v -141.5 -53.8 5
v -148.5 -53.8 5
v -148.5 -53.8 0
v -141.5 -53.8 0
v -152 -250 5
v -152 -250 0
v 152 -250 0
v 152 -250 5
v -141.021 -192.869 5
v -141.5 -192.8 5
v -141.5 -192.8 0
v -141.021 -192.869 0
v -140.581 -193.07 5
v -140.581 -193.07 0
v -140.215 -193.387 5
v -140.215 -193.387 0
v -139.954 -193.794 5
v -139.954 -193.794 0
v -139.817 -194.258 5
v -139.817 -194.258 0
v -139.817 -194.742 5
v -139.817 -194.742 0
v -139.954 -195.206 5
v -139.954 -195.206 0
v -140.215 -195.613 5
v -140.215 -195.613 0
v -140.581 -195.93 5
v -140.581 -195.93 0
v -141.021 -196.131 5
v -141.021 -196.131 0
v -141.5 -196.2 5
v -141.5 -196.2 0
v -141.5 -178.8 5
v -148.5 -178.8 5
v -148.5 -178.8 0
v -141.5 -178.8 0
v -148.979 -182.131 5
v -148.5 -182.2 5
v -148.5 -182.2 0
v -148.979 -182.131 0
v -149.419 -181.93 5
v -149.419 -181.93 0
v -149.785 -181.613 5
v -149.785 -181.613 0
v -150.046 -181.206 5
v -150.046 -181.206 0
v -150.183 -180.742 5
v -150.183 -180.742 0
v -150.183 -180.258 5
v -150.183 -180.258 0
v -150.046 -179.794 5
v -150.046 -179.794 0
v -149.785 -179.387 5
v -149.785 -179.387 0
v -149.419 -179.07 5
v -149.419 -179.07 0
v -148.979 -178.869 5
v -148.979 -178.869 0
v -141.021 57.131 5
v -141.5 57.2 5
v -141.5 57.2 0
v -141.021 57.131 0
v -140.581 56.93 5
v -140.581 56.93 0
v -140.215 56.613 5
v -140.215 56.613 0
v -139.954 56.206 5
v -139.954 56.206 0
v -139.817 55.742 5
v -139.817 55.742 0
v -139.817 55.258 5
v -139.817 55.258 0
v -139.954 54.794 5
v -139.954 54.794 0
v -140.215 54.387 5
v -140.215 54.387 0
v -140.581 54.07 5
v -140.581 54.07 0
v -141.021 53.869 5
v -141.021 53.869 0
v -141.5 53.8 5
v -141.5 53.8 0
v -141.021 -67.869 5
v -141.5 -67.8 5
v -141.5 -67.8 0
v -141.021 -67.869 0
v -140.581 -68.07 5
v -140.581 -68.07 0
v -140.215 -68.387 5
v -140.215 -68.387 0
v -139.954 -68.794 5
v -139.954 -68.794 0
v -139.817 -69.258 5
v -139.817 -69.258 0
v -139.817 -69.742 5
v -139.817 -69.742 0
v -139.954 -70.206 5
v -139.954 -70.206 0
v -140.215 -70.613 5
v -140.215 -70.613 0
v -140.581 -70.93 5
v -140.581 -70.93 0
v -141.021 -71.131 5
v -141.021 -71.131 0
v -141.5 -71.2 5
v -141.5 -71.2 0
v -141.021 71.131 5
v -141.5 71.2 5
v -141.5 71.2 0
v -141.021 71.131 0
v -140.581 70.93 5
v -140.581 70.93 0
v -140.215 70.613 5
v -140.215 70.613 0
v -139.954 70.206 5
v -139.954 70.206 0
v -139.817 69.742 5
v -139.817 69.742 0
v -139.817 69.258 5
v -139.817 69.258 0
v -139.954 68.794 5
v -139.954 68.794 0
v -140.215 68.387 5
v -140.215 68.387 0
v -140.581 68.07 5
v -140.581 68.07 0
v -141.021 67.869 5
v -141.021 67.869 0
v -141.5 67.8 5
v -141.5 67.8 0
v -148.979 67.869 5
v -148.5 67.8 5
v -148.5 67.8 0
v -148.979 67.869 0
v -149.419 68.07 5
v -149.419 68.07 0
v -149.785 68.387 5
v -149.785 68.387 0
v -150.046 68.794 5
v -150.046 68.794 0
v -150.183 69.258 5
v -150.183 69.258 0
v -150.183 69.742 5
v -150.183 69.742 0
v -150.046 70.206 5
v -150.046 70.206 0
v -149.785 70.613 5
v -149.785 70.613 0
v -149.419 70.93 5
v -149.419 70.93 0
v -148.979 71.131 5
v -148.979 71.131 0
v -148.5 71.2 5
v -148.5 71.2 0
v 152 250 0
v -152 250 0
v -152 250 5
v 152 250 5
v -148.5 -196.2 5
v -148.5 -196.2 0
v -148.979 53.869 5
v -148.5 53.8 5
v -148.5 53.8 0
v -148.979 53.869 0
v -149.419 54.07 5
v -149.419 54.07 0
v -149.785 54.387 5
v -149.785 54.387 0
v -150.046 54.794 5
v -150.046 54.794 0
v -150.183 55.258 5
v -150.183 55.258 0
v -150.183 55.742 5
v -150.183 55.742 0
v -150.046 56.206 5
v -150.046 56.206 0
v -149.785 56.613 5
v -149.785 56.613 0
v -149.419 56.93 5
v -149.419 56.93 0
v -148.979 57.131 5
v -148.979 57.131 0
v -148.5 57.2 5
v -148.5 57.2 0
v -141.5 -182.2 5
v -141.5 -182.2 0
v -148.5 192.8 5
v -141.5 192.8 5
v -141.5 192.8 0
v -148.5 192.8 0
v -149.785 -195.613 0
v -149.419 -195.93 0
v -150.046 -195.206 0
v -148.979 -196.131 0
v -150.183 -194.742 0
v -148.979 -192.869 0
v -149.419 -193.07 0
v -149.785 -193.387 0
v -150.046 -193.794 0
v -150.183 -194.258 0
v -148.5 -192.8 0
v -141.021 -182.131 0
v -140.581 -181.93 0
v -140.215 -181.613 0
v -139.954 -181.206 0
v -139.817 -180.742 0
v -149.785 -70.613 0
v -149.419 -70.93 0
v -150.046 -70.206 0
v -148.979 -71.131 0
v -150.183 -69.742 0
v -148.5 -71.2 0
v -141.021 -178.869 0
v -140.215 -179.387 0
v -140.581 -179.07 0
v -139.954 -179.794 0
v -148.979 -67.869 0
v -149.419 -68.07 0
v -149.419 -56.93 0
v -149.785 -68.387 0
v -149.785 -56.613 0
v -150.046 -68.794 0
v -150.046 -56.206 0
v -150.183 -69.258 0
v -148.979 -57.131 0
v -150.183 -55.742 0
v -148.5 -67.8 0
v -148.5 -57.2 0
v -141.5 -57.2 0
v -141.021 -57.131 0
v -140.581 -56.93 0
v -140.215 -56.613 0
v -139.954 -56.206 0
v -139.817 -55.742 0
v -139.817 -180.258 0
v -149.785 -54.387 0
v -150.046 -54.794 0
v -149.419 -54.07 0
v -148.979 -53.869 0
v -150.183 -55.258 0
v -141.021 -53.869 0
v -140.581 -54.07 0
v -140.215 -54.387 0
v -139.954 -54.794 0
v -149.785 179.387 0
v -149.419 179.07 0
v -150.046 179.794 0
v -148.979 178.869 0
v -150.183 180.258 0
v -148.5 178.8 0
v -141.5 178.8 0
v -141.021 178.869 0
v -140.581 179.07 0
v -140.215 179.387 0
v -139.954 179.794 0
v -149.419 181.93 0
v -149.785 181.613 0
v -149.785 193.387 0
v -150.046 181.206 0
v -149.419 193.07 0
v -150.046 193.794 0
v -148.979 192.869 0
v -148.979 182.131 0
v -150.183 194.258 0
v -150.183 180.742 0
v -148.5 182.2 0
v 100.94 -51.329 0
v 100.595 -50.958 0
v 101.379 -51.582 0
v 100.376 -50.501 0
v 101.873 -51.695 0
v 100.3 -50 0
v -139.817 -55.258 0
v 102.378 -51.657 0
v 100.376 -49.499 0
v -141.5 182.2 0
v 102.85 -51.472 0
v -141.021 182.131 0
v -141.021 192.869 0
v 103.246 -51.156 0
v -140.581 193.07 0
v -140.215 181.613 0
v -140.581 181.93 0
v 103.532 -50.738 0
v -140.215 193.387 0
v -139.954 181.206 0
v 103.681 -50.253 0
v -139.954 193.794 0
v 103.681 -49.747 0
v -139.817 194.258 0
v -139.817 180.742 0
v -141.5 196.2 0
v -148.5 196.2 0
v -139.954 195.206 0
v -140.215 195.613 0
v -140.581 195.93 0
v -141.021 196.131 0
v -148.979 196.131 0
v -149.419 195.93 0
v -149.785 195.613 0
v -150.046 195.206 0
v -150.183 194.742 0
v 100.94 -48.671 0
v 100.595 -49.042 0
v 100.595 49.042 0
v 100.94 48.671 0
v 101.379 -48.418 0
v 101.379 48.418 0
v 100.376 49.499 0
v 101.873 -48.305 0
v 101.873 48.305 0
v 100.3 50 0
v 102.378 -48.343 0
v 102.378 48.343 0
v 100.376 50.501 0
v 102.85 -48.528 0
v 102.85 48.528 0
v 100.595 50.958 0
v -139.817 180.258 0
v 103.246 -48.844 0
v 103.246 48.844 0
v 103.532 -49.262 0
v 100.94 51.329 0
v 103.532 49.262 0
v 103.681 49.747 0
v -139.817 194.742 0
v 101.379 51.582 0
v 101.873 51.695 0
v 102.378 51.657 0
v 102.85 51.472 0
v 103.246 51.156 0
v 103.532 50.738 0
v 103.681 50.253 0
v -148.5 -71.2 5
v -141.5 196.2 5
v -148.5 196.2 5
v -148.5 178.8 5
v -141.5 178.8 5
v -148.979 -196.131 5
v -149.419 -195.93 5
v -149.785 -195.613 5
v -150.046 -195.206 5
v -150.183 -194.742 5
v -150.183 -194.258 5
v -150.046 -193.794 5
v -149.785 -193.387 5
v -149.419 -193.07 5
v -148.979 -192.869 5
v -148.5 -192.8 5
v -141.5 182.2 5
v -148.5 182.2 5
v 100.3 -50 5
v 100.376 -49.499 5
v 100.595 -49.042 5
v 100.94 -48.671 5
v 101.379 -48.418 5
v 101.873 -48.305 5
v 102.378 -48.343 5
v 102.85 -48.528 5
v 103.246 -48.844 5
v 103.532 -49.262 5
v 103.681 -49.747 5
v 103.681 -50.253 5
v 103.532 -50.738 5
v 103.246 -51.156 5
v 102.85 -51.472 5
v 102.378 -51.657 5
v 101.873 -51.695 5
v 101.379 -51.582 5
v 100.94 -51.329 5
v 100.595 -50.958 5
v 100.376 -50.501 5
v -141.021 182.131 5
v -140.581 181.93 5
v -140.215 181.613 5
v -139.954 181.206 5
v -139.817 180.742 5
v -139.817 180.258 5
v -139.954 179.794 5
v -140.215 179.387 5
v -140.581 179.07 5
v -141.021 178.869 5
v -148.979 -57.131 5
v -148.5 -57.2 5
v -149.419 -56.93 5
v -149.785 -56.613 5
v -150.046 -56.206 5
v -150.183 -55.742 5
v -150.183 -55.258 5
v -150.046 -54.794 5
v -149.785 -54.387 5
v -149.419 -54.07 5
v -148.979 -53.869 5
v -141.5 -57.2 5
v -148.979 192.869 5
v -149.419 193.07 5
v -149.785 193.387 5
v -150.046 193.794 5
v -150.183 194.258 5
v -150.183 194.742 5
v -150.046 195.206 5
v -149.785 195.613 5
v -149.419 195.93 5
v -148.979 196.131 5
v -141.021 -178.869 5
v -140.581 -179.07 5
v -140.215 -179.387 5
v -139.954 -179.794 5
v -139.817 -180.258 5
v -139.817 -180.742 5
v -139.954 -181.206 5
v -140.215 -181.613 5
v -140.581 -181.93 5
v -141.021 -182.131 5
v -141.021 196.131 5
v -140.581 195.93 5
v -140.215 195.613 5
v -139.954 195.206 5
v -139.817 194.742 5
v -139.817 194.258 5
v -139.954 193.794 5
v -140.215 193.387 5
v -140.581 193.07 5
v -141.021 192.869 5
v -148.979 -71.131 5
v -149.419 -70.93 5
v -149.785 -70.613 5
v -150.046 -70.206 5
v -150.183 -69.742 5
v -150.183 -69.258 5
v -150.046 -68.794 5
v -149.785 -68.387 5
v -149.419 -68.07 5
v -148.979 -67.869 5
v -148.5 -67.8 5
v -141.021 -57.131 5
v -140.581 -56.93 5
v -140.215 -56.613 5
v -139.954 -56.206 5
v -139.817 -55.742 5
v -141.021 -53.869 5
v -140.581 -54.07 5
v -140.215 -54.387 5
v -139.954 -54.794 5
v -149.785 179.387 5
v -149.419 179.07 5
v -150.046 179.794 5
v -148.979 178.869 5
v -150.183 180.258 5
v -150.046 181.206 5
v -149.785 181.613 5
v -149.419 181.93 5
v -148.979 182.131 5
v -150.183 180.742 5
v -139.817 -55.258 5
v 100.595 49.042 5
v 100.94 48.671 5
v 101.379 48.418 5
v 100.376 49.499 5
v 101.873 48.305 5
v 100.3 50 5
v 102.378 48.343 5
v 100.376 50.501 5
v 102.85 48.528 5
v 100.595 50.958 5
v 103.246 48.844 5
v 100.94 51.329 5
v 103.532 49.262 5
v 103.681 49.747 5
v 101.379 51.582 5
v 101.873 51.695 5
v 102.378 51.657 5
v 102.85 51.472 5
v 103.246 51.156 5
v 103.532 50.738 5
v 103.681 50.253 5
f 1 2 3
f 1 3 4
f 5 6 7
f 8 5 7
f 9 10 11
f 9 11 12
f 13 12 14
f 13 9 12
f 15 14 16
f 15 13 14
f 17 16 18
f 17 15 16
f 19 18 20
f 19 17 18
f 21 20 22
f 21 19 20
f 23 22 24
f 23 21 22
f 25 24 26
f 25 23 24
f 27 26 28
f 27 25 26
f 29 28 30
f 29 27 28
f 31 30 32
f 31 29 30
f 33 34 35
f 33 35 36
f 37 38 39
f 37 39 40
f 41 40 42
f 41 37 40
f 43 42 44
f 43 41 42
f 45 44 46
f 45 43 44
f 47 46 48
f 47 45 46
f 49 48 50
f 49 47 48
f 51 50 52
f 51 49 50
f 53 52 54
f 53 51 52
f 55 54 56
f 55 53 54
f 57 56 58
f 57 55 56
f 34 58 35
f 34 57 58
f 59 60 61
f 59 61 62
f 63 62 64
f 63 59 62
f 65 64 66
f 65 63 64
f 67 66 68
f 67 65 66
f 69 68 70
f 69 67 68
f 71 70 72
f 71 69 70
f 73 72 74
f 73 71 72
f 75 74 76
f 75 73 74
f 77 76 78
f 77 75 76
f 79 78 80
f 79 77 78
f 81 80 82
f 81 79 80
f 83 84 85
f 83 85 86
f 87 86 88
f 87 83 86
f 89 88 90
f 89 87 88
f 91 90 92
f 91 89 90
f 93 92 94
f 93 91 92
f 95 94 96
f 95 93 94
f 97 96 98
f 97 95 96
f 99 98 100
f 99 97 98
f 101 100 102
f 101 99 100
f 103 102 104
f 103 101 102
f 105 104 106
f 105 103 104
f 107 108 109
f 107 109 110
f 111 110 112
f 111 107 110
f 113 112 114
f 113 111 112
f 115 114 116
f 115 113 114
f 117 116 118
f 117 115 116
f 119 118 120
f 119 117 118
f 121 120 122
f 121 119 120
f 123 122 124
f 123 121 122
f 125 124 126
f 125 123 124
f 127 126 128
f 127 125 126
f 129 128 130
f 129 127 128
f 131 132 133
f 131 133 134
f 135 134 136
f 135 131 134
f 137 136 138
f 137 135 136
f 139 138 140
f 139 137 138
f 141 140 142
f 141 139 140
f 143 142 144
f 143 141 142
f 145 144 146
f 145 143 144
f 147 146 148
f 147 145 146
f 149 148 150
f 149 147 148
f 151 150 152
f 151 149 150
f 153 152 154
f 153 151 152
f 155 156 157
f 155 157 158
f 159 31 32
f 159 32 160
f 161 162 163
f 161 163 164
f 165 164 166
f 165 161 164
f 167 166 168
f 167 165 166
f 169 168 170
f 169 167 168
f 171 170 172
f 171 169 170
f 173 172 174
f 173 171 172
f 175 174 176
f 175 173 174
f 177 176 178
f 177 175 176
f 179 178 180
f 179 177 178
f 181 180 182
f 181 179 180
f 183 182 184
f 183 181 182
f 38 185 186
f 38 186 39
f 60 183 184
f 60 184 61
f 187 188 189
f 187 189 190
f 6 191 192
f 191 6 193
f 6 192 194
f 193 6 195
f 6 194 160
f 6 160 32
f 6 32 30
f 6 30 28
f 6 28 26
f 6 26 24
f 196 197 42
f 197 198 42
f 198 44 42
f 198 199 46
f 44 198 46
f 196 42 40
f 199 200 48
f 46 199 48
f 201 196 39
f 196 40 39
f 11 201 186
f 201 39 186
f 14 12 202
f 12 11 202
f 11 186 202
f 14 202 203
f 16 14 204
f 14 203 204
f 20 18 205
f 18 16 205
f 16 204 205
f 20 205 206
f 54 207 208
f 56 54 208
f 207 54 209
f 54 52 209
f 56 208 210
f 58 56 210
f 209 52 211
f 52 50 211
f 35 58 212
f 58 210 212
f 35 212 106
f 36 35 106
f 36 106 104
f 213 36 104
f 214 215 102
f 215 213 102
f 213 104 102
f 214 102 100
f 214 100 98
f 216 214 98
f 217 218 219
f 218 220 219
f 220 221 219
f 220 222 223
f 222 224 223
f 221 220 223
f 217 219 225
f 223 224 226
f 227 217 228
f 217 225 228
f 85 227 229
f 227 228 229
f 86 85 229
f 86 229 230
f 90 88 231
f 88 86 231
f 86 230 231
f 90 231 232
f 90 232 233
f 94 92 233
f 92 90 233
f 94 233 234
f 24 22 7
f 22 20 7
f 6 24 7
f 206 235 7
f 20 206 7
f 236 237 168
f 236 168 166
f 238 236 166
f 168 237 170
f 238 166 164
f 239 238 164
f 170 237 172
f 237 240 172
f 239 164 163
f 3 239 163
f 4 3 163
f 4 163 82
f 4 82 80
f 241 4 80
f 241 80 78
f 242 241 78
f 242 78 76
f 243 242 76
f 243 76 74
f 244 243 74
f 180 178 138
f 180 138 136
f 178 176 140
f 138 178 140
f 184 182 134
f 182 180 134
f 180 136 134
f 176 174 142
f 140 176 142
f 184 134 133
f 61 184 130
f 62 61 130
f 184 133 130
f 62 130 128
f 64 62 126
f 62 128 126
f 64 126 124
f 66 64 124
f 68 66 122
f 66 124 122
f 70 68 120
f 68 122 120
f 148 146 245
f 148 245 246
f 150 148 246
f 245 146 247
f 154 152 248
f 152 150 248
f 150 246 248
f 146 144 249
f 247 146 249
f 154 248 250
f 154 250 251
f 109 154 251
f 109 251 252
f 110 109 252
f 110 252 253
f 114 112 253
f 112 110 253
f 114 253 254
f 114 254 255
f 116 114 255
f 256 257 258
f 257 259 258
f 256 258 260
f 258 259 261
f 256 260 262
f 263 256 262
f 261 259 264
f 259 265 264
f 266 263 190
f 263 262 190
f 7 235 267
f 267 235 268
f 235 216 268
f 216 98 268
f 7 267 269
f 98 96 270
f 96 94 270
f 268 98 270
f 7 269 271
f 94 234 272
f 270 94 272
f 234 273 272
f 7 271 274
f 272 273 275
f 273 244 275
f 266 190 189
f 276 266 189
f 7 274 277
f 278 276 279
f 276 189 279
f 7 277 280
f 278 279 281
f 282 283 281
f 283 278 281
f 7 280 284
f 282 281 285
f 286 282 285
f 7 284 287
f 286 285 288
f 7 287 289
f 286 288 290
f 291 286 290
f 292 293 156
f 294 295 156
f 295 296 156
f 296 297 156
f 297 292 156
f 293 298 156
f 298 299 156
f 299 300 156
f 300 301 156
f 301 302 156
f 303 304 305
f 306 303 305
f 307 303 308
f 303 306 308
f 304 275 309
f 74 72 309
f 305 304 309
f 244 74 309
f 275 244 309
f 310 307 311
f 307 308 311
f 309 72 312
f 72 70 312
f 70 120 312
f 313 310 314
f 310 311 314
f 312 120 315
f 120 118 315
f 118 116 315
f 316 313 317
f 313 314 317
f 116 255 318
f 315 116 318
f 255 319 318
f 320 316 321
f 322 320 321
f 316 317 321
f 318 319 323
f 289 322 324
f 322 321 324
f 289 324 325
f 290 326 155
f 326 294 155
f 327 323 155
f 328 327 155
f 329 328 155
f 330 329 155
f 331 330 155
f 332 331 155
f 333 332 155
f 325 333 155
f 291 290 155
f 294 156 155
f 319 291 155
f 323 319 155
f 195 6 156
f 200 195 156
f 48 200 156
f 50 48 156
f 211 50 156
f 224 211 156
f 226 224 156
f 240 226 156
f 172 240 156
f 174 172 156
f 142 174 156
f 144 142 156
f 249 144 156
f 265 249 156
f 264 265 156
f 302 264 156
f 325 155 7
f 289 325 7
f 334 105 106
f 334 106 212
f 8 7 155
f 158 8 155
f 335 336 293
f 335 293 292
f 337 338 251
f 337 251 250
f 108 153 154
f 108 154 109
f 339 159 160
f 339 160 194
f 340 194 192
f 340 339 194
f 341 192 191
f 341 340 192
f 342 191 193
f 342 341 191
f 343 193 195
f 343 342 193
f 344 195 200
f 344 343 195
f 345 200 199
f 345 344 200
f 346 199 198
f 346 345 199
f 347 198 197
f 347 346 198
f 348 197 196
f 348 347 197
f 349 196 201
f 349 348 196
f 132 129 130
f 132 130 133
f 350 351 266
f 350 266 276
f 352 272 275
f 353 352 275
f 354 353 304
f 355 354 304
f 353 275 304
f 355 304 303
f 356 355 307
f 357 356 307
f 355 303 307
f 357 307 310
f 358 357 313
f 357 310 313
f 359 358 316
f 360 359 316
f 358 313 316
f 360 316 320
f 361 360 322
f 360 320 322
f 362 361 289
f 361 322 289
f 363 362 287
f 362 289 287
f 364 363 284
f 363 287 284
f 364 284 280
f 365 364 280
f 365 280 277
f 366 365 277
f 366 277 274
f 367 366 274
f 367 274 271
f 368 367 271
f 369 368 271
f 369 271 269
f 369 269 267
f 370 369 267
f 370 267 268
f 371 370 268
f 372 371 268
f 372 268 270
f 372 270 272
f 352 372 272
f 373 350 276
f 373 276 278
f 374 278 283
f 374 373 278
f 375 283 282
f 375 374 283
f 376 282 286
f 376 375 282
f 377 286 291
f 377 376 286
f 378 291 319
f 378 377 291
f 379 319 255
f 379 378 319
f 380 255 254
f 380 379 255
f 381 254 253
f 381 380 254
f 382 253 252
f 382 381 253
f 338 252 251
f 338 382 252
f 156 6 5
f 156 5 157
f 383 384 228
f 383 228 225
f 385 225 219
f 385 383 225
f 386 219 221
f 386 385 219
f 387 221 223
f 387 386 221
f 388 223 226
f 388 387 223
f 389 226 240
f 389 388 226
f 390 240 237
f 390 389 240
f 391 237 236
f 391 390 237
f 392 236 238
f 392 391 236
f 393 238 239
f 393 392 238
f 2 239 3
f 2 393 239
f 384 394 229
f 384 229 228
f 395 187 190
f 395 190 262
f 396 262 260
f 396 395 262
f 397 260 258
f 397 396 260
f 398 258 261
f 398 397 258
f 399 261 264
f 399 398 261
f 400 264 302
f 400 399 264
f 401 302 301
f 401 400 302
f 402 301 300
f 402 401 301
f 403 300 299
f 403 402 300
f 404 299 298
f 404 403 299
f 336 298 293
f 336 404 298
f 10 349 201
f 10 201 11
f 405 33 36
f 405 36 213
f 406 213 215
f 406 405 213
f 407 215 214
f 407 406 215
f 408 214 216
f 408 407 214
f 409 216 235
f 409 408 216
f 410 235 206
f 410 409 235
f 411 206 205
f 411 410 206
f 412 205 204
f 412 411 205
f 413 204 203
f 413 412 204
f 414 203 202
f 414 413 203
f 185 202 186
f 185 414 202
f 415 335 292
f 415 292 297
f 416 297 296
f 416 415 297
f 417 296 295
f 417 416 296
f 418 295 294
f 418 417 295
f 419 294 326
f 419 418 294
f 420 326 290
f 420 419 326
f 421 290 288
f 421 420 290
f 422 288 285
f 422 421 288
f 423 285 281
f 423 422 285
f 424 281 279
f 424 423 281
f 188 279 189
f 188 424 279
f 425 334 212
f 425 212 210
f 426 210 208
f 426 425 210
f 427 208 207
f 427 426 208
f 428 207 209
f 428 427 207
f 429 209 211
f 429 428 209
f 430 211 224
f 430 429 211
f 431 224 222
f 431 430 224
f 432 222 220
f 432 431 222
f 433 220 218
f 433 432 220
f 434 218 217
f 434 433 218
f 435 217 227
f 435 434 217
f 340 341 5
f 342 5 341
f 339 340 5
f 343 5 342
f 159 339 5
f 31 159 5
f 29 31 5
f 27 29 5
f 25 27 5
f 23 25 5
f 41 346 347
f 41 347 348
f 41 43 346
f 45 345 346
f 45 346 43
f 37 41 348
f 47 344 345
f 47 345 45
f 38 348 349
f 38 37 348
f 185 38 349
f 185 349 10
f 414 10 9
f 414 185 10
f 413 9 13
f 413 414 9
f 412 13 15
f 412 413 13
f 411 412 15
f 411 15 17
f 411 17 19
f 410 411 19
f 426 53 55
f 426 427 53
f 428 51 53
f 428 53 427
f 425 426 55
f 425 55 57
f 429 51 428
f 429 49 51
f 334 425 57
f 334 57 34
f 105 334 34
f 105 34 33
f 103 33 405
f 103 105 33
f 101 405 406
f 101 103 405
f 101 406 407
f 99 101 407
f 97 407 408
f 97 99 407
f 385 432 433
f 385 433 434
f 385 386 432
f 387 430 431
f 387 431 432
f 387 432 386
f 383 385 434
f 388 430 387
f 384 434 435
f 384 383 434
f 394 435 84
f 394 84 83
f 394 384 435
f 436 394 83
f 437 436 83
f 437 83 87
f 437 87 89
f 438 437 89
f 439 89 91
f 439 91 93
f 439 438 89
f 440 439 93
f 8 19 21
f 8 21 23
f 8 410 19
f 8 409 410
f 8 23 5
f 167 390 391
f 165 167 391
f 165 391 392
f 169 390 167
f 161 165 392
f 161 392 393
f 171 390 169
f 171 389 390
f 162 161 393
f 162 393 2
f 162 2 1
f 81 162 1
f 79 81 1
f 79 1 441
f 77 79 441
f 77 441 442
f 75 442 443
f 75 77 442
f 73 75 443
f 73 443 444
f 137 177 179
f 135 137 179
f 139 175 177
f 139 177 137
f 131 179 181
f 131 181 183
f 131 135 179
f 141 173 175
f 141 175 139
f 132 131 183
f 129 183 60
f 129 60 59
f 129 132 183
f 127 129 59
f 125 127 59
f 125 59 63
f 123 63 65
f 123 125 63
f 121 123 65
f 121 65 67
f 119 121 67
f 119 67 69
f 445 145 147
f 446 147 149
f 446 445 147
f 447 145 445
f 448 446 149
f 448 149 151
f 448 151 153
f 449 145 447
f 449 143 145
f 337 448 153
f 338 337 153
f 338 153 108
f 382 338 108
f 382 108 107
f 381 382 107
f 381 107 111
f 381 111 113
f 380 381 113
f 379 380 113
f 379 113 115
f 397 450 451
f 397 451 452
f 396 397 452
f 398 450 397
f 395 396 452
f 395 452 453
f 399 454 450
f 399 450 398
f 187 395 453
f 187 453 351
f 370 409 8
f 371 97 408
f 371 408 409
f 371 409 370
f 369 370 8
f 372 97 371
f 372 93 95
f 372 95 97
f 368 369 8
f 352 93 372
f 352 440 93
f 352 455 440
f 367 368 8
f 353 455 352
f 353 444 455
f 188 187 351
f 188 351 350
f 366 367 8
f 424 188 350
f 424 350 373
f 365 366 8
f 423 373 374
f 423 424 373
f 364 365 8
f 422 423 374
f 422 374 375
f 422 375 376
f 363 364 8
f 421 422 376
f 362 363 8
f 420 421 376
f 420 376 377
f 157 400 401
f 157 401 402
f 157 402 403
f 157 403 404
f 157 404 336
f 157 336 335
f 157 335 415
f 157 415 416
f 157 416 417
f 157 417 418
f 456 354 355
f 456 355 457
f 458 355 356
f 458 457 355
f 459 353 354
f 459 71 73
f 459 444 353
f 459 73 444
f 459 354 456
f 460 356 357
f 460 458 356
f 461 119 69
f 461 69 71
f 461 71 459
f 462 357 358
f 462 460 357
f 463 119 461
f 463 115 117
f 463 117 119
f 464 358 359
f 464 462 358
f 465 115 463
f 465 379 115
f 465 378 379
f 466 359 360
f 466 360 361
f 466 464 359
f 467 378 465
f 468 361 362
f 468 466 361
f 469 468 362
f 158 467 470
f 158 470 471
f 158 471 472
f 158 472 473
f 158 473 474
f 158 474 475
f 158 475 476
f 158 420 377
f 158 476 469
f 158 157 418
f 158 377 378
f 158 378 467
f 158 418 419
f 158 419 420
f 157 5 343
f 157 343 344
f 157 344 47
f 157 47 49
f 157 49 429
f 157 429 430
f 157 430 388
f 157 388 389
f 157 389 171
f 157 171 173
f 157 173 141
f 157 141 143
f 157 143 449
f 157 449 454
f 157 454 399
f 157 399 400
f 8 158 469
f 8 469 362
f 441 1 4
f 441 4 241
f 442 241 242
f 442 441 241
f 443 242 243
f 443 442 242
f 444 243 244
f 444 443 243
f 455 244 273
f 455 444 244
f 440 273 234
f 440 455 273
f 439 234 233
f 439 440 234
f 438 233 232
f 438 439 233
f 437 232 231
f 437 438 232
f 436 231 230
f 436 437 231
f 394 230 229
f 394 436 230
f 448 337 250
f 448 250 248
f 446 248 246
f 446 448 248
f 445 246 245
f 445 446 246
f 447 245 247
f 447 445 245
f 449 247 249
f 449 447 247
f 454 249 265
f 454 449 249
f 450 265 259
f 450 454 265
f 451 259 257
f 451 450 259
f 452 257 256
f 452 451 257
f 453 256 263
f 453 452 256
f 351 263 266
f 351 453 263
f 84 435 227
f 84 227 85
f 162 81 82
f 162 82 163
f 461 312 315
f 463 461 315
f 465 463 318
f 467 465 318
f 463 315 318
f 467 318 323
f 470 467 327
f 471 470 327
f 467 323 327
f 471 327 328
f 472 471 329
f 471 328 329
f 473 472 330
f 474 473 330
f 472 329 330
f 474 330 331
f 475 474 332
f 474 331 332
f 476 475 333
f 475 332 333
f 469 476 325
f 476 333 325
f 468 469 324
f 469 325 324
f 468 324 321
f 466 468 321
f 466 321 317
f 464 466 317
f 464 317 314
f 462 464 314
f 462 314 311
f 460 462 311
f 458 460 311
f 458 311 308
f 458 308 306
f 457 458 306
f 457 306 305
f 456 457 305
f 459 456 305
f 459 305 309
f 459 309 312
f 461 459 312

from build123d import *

# Parameters (mm, degrees)
ESQUISSE1_W             = 304
ESQUISSE1_H             = 500
BOSS_EXTRU_1_DEPTH      = 5
D_GAGEMENT_M34_D        = 3.4
ENL_V_MAT_EXTRU_3_REACH = 294.624


with BuildPart() as part:
    # Esquisse1 → Boss.-Extru.1 (new body)
    with BuildSketch(Plane.XY):
        Rectangle(ESQUISSE1_W, ESQUISSE1_H)
    extrude(amount=BOSS_EXTRU_1_DEPTH)

    # Dégagement M34 (through all)
    with Locations(Plane.XY.offset(5)):
        with Locations((102, -50), (102, 50)):
            Hole(D_GAGEMENT_M34_D / 2)

    # Esquisse15 → Enlèv. mat.-Extru.3 (cut, up to next)
    with BuildSketch(Plane.XY.offset(5), mode=Mode.PRIVATE) as enl_v_mat_extru_3_sk1:
        with BuildLine():
            Line((-148.5, -192.8), (-141.5, -192.8))
            ThreePointArc((-141.5, -192.8), (-139.8, -194.5), (-141.5, -196.2))
            Line((-141.5, -196.2), (-148.5, -196.2))
            ThreePointArc((-148.5, -196.2), (-150.2, -194.5), (-148.5, -192.8))
        make_face()
    enl_v_mat_extru_3_tool1 = extrude(enl_v_mat_extru_3_sk1.sketch, amount=-ENL_V_MAT_EXTRU_3_REACH, mode=Mode.PRIVATE) & part.part
    # Esquisse15 → Enlèv. mat.-Extru.3 (cut, up to next)
    with BuildSketch(Plane.XY.offset(5), mode=Mode.PRIVATE) as enl_v_mat_extru_3_sk2:
        with BuildLine():
            Line((-141.5, -182.2), (-148.5, -182.2))
            ThreePointArc((-148.5, -182.2), (-150.2, -180.5), (-148.5, -178.8))
            Line((-148.5, -178.8), (-141.5, -178.8))
            ThreePointArc((-141.5, -178.8), (-139.8, -180.5), (-141.5, -182.2))
        make_face()
    enl_v_mat_extru_3_tool2 = extrude(enl_v_mat_extru_3_sk2.sketch, amount=-ENL_V_MAT_EXTRU_3_REACH, mode=Mode.PRIVATE) & part.part
    # Esquisse15 → Enlèv. mat.-Extru.3 (cut, up to next)
    with BuildSketch(Plane.XY.offset(5), mode=Mode.PRIVATE) as enl_v_mat_extru_3_sk3:
        with BuildLine():
            Line((-148.5, -67.8), (-141.5, -67.8))
            ThreePointArc((-141.5, -67.8), (-139.8, -69.5), (-141.5, -71.2))
            Line((-141.5, -71.2), (-148.5, -71.2))
            ThreePointArc((-148.5, -71.2), (-150.2, -69.5), (-148.5, -67.8))
        make_face()
    enl_v_mat_extru_3_tool3 = extrude(enl_v_mat_extru_3_sk3.sketch, amount=-ENL_V_MAT_EXTRU_3_REACH, mode=Mode.PRIVATE) & part.part
    # Esquisse15 → Enlèv. mat.-Extru.3 (cut, up to next)
    with BuildSketch(Plane.XY.offset(5), mode=Mode.PRIVATE) as enl_v_mat_extru_3_sk4:
        with BuildLine():
            Line((-141.5, -57.2), (-148.5, -57.2))
            ThreePointArc((-148.5, -57.2), (-150.2, -55.5), (-148.5, -53.8))
            Line((-148.5, -53.8), (-141.5, -53.8))
            ThreePointArc((-141.5, -53.8), (-139.8, -55.5), (-141.5, -57.2))
        make_face()
    enl_v_mat_extru_3_tool4 = extrude(enl_v_mat_extru_3_sk4.sketch, amount=-ENL_V_MAT_EXTRU_3_REACH, mode=Mode.PRIVATE) & part.part
    # Esquisse15 → Enlèv. mat.-Extru.3 (cut, up to next)
    with BuildSketch(Plane.XY.offset(5), mode=Mode.PRIVATE) as enl_v_mat_extru_3_sk5:
        with BuildLine():
            Line((-148.5, 57.2), (-141.5, 57.2))
            ThreePointArc((-141.5, 57.2), (-139.8, 55.5), (-141.5, 53.8))
            Line((-141.5, 53.8), (-148.5, 53.8))
            ThreePointArc((-148.5, 53.8), (-150.2, 55.5), (-148.5, 57.2))
        make_face()
    enl_v_mat_extru_3_tool5 = extrude(enl_v_mat_extru_3_sk5.sketch, amount=-ENL_V_MAT_EXTRU_3_REACH, mode=Mode.PRIVATE) & part.part
    # Esquisse15 → Enlèv. mat.-Extru.3 (cut, up to next)
    with BuildSketch(Plane.XY.offset(5), mode=Mode.PRIVATE) as enl_v_mat_extru_3_sk6:
        with BuildLine():
            Line((-141.5, 67.8), (-148.5, 67.8))
            ThreePointArc((-148.5, 67.8), (-150.2, 69.5), (-148.5, 71.2))
            Line((-148.5, 71.2), (-141.5, 71.2))
            ThreePointArc((-141.5, 71.2), (-139.8, 69.5), (-141.5, 67.8))
        make_face()
    enl_v_mat_extru_3_tool6 = extrude(enl_v_mat_extru_3_sk6.sketch, amount=-ENL_V_MAT_EXTRU_3_REACH, mode=Mode.PRIVATE) & part.part
    # Esquisse15 → Enlèv. mat.-Extru.3 (cut, up to next)
    with BuildSketch(Plane.XY.offset(5), mode=Mode.PRIVATE) as enl_v_mat_extru_3_sk7:
        with BuildLine():
            Line((-148.5, 182.2), (-141.5, 182.2))
            ThreePointArc((-141.5, 182.2), (-139.8, 180.5), (-141.5, 178.8))
            Line((-141.5, 178.8), (-148.5, 178.8))
            ThreePointArc((-148.5, 178.8), (-150.2, 180.5), (-148.5, 182.2))
        make_face()
    enl_v_mat_extru_3_tool7 = extrude(enl_v_mat_extru_3_sk7.sketch, amount=-ENL_V_MAT_EXTRU_3_REACH, mode=Mode.PRIVATE) & part.part
    # Esquisse15 → Enlèv. mat.-Extru.3 (cut, up to next)
    with BuildSketch(Plane.XY.offset(5), mode=Mode.PRIVATE) as enl_v_mat_extru_3_sk8:
        with BuildLine():
            Line((-141.5, 192.8), (-148.5, 192.8))
            ThreePointArc((-148.5, 192.8), (-150.2, 194.5), (-148.5, 196.2))
            Line((-148.5, 196.2), (-141.5, 196.2))
            ThreePointArc((-141.5, 196.2), (-139.8, 194.5), (-141.5, 192.8))
        make_face()
    enl_v_mat_extru_3_tool8 = extrude(enl_v_mat_extru_3_sk8.sketch, amount=-ENL_V_MAT_EXTRU_3_REACH, mode=Mode.PRIVATE) & part.part
    add(enl_v_mat_extru_3_tool1.solids().sort_by_distance((-145, -194.5, 5))[0], mode=Mode.SUBTRACT)
    add(enl_v_mat_extru_3_tool2.solids().sort_by_distance((-145, -180.5, 5))[0], mode=Mode.SUBTRACT)
    add(enl_v_mat_extru_3_tool3.solids().sort_by_distance((-145, -69.5, 5))[0], mode=Mode.SUBTRACT)
    add(enl_v_mat_extru_3_tool4.solids().sort_by_distance((-145, -55.5, 5))[0], mode=Mode.SUBTRACT)
    add(enl_v_mat_extru_3_tool5.solids().sort_by_distance((-145, 55.5, 5))[0], mode=Mode.SUBTRACT)
    add(enl_v_mat_extru_3_tool6.solids().sort_by_distance((-145, 69.5, 5))[0], mode=Mode.SUBTRACT)
    add(enl_v_mat_extru_3_tool7.solids().sort_by_distance((-145, 180.5, 5))[0], mode=Mode.SUBTRACT)
    add(enl_v_mat_extru_3_tool8.solids().sort_by_distance((-145, 194.5, 5))[0], mode=Mode.SUBTRACT)


solid = part.part
